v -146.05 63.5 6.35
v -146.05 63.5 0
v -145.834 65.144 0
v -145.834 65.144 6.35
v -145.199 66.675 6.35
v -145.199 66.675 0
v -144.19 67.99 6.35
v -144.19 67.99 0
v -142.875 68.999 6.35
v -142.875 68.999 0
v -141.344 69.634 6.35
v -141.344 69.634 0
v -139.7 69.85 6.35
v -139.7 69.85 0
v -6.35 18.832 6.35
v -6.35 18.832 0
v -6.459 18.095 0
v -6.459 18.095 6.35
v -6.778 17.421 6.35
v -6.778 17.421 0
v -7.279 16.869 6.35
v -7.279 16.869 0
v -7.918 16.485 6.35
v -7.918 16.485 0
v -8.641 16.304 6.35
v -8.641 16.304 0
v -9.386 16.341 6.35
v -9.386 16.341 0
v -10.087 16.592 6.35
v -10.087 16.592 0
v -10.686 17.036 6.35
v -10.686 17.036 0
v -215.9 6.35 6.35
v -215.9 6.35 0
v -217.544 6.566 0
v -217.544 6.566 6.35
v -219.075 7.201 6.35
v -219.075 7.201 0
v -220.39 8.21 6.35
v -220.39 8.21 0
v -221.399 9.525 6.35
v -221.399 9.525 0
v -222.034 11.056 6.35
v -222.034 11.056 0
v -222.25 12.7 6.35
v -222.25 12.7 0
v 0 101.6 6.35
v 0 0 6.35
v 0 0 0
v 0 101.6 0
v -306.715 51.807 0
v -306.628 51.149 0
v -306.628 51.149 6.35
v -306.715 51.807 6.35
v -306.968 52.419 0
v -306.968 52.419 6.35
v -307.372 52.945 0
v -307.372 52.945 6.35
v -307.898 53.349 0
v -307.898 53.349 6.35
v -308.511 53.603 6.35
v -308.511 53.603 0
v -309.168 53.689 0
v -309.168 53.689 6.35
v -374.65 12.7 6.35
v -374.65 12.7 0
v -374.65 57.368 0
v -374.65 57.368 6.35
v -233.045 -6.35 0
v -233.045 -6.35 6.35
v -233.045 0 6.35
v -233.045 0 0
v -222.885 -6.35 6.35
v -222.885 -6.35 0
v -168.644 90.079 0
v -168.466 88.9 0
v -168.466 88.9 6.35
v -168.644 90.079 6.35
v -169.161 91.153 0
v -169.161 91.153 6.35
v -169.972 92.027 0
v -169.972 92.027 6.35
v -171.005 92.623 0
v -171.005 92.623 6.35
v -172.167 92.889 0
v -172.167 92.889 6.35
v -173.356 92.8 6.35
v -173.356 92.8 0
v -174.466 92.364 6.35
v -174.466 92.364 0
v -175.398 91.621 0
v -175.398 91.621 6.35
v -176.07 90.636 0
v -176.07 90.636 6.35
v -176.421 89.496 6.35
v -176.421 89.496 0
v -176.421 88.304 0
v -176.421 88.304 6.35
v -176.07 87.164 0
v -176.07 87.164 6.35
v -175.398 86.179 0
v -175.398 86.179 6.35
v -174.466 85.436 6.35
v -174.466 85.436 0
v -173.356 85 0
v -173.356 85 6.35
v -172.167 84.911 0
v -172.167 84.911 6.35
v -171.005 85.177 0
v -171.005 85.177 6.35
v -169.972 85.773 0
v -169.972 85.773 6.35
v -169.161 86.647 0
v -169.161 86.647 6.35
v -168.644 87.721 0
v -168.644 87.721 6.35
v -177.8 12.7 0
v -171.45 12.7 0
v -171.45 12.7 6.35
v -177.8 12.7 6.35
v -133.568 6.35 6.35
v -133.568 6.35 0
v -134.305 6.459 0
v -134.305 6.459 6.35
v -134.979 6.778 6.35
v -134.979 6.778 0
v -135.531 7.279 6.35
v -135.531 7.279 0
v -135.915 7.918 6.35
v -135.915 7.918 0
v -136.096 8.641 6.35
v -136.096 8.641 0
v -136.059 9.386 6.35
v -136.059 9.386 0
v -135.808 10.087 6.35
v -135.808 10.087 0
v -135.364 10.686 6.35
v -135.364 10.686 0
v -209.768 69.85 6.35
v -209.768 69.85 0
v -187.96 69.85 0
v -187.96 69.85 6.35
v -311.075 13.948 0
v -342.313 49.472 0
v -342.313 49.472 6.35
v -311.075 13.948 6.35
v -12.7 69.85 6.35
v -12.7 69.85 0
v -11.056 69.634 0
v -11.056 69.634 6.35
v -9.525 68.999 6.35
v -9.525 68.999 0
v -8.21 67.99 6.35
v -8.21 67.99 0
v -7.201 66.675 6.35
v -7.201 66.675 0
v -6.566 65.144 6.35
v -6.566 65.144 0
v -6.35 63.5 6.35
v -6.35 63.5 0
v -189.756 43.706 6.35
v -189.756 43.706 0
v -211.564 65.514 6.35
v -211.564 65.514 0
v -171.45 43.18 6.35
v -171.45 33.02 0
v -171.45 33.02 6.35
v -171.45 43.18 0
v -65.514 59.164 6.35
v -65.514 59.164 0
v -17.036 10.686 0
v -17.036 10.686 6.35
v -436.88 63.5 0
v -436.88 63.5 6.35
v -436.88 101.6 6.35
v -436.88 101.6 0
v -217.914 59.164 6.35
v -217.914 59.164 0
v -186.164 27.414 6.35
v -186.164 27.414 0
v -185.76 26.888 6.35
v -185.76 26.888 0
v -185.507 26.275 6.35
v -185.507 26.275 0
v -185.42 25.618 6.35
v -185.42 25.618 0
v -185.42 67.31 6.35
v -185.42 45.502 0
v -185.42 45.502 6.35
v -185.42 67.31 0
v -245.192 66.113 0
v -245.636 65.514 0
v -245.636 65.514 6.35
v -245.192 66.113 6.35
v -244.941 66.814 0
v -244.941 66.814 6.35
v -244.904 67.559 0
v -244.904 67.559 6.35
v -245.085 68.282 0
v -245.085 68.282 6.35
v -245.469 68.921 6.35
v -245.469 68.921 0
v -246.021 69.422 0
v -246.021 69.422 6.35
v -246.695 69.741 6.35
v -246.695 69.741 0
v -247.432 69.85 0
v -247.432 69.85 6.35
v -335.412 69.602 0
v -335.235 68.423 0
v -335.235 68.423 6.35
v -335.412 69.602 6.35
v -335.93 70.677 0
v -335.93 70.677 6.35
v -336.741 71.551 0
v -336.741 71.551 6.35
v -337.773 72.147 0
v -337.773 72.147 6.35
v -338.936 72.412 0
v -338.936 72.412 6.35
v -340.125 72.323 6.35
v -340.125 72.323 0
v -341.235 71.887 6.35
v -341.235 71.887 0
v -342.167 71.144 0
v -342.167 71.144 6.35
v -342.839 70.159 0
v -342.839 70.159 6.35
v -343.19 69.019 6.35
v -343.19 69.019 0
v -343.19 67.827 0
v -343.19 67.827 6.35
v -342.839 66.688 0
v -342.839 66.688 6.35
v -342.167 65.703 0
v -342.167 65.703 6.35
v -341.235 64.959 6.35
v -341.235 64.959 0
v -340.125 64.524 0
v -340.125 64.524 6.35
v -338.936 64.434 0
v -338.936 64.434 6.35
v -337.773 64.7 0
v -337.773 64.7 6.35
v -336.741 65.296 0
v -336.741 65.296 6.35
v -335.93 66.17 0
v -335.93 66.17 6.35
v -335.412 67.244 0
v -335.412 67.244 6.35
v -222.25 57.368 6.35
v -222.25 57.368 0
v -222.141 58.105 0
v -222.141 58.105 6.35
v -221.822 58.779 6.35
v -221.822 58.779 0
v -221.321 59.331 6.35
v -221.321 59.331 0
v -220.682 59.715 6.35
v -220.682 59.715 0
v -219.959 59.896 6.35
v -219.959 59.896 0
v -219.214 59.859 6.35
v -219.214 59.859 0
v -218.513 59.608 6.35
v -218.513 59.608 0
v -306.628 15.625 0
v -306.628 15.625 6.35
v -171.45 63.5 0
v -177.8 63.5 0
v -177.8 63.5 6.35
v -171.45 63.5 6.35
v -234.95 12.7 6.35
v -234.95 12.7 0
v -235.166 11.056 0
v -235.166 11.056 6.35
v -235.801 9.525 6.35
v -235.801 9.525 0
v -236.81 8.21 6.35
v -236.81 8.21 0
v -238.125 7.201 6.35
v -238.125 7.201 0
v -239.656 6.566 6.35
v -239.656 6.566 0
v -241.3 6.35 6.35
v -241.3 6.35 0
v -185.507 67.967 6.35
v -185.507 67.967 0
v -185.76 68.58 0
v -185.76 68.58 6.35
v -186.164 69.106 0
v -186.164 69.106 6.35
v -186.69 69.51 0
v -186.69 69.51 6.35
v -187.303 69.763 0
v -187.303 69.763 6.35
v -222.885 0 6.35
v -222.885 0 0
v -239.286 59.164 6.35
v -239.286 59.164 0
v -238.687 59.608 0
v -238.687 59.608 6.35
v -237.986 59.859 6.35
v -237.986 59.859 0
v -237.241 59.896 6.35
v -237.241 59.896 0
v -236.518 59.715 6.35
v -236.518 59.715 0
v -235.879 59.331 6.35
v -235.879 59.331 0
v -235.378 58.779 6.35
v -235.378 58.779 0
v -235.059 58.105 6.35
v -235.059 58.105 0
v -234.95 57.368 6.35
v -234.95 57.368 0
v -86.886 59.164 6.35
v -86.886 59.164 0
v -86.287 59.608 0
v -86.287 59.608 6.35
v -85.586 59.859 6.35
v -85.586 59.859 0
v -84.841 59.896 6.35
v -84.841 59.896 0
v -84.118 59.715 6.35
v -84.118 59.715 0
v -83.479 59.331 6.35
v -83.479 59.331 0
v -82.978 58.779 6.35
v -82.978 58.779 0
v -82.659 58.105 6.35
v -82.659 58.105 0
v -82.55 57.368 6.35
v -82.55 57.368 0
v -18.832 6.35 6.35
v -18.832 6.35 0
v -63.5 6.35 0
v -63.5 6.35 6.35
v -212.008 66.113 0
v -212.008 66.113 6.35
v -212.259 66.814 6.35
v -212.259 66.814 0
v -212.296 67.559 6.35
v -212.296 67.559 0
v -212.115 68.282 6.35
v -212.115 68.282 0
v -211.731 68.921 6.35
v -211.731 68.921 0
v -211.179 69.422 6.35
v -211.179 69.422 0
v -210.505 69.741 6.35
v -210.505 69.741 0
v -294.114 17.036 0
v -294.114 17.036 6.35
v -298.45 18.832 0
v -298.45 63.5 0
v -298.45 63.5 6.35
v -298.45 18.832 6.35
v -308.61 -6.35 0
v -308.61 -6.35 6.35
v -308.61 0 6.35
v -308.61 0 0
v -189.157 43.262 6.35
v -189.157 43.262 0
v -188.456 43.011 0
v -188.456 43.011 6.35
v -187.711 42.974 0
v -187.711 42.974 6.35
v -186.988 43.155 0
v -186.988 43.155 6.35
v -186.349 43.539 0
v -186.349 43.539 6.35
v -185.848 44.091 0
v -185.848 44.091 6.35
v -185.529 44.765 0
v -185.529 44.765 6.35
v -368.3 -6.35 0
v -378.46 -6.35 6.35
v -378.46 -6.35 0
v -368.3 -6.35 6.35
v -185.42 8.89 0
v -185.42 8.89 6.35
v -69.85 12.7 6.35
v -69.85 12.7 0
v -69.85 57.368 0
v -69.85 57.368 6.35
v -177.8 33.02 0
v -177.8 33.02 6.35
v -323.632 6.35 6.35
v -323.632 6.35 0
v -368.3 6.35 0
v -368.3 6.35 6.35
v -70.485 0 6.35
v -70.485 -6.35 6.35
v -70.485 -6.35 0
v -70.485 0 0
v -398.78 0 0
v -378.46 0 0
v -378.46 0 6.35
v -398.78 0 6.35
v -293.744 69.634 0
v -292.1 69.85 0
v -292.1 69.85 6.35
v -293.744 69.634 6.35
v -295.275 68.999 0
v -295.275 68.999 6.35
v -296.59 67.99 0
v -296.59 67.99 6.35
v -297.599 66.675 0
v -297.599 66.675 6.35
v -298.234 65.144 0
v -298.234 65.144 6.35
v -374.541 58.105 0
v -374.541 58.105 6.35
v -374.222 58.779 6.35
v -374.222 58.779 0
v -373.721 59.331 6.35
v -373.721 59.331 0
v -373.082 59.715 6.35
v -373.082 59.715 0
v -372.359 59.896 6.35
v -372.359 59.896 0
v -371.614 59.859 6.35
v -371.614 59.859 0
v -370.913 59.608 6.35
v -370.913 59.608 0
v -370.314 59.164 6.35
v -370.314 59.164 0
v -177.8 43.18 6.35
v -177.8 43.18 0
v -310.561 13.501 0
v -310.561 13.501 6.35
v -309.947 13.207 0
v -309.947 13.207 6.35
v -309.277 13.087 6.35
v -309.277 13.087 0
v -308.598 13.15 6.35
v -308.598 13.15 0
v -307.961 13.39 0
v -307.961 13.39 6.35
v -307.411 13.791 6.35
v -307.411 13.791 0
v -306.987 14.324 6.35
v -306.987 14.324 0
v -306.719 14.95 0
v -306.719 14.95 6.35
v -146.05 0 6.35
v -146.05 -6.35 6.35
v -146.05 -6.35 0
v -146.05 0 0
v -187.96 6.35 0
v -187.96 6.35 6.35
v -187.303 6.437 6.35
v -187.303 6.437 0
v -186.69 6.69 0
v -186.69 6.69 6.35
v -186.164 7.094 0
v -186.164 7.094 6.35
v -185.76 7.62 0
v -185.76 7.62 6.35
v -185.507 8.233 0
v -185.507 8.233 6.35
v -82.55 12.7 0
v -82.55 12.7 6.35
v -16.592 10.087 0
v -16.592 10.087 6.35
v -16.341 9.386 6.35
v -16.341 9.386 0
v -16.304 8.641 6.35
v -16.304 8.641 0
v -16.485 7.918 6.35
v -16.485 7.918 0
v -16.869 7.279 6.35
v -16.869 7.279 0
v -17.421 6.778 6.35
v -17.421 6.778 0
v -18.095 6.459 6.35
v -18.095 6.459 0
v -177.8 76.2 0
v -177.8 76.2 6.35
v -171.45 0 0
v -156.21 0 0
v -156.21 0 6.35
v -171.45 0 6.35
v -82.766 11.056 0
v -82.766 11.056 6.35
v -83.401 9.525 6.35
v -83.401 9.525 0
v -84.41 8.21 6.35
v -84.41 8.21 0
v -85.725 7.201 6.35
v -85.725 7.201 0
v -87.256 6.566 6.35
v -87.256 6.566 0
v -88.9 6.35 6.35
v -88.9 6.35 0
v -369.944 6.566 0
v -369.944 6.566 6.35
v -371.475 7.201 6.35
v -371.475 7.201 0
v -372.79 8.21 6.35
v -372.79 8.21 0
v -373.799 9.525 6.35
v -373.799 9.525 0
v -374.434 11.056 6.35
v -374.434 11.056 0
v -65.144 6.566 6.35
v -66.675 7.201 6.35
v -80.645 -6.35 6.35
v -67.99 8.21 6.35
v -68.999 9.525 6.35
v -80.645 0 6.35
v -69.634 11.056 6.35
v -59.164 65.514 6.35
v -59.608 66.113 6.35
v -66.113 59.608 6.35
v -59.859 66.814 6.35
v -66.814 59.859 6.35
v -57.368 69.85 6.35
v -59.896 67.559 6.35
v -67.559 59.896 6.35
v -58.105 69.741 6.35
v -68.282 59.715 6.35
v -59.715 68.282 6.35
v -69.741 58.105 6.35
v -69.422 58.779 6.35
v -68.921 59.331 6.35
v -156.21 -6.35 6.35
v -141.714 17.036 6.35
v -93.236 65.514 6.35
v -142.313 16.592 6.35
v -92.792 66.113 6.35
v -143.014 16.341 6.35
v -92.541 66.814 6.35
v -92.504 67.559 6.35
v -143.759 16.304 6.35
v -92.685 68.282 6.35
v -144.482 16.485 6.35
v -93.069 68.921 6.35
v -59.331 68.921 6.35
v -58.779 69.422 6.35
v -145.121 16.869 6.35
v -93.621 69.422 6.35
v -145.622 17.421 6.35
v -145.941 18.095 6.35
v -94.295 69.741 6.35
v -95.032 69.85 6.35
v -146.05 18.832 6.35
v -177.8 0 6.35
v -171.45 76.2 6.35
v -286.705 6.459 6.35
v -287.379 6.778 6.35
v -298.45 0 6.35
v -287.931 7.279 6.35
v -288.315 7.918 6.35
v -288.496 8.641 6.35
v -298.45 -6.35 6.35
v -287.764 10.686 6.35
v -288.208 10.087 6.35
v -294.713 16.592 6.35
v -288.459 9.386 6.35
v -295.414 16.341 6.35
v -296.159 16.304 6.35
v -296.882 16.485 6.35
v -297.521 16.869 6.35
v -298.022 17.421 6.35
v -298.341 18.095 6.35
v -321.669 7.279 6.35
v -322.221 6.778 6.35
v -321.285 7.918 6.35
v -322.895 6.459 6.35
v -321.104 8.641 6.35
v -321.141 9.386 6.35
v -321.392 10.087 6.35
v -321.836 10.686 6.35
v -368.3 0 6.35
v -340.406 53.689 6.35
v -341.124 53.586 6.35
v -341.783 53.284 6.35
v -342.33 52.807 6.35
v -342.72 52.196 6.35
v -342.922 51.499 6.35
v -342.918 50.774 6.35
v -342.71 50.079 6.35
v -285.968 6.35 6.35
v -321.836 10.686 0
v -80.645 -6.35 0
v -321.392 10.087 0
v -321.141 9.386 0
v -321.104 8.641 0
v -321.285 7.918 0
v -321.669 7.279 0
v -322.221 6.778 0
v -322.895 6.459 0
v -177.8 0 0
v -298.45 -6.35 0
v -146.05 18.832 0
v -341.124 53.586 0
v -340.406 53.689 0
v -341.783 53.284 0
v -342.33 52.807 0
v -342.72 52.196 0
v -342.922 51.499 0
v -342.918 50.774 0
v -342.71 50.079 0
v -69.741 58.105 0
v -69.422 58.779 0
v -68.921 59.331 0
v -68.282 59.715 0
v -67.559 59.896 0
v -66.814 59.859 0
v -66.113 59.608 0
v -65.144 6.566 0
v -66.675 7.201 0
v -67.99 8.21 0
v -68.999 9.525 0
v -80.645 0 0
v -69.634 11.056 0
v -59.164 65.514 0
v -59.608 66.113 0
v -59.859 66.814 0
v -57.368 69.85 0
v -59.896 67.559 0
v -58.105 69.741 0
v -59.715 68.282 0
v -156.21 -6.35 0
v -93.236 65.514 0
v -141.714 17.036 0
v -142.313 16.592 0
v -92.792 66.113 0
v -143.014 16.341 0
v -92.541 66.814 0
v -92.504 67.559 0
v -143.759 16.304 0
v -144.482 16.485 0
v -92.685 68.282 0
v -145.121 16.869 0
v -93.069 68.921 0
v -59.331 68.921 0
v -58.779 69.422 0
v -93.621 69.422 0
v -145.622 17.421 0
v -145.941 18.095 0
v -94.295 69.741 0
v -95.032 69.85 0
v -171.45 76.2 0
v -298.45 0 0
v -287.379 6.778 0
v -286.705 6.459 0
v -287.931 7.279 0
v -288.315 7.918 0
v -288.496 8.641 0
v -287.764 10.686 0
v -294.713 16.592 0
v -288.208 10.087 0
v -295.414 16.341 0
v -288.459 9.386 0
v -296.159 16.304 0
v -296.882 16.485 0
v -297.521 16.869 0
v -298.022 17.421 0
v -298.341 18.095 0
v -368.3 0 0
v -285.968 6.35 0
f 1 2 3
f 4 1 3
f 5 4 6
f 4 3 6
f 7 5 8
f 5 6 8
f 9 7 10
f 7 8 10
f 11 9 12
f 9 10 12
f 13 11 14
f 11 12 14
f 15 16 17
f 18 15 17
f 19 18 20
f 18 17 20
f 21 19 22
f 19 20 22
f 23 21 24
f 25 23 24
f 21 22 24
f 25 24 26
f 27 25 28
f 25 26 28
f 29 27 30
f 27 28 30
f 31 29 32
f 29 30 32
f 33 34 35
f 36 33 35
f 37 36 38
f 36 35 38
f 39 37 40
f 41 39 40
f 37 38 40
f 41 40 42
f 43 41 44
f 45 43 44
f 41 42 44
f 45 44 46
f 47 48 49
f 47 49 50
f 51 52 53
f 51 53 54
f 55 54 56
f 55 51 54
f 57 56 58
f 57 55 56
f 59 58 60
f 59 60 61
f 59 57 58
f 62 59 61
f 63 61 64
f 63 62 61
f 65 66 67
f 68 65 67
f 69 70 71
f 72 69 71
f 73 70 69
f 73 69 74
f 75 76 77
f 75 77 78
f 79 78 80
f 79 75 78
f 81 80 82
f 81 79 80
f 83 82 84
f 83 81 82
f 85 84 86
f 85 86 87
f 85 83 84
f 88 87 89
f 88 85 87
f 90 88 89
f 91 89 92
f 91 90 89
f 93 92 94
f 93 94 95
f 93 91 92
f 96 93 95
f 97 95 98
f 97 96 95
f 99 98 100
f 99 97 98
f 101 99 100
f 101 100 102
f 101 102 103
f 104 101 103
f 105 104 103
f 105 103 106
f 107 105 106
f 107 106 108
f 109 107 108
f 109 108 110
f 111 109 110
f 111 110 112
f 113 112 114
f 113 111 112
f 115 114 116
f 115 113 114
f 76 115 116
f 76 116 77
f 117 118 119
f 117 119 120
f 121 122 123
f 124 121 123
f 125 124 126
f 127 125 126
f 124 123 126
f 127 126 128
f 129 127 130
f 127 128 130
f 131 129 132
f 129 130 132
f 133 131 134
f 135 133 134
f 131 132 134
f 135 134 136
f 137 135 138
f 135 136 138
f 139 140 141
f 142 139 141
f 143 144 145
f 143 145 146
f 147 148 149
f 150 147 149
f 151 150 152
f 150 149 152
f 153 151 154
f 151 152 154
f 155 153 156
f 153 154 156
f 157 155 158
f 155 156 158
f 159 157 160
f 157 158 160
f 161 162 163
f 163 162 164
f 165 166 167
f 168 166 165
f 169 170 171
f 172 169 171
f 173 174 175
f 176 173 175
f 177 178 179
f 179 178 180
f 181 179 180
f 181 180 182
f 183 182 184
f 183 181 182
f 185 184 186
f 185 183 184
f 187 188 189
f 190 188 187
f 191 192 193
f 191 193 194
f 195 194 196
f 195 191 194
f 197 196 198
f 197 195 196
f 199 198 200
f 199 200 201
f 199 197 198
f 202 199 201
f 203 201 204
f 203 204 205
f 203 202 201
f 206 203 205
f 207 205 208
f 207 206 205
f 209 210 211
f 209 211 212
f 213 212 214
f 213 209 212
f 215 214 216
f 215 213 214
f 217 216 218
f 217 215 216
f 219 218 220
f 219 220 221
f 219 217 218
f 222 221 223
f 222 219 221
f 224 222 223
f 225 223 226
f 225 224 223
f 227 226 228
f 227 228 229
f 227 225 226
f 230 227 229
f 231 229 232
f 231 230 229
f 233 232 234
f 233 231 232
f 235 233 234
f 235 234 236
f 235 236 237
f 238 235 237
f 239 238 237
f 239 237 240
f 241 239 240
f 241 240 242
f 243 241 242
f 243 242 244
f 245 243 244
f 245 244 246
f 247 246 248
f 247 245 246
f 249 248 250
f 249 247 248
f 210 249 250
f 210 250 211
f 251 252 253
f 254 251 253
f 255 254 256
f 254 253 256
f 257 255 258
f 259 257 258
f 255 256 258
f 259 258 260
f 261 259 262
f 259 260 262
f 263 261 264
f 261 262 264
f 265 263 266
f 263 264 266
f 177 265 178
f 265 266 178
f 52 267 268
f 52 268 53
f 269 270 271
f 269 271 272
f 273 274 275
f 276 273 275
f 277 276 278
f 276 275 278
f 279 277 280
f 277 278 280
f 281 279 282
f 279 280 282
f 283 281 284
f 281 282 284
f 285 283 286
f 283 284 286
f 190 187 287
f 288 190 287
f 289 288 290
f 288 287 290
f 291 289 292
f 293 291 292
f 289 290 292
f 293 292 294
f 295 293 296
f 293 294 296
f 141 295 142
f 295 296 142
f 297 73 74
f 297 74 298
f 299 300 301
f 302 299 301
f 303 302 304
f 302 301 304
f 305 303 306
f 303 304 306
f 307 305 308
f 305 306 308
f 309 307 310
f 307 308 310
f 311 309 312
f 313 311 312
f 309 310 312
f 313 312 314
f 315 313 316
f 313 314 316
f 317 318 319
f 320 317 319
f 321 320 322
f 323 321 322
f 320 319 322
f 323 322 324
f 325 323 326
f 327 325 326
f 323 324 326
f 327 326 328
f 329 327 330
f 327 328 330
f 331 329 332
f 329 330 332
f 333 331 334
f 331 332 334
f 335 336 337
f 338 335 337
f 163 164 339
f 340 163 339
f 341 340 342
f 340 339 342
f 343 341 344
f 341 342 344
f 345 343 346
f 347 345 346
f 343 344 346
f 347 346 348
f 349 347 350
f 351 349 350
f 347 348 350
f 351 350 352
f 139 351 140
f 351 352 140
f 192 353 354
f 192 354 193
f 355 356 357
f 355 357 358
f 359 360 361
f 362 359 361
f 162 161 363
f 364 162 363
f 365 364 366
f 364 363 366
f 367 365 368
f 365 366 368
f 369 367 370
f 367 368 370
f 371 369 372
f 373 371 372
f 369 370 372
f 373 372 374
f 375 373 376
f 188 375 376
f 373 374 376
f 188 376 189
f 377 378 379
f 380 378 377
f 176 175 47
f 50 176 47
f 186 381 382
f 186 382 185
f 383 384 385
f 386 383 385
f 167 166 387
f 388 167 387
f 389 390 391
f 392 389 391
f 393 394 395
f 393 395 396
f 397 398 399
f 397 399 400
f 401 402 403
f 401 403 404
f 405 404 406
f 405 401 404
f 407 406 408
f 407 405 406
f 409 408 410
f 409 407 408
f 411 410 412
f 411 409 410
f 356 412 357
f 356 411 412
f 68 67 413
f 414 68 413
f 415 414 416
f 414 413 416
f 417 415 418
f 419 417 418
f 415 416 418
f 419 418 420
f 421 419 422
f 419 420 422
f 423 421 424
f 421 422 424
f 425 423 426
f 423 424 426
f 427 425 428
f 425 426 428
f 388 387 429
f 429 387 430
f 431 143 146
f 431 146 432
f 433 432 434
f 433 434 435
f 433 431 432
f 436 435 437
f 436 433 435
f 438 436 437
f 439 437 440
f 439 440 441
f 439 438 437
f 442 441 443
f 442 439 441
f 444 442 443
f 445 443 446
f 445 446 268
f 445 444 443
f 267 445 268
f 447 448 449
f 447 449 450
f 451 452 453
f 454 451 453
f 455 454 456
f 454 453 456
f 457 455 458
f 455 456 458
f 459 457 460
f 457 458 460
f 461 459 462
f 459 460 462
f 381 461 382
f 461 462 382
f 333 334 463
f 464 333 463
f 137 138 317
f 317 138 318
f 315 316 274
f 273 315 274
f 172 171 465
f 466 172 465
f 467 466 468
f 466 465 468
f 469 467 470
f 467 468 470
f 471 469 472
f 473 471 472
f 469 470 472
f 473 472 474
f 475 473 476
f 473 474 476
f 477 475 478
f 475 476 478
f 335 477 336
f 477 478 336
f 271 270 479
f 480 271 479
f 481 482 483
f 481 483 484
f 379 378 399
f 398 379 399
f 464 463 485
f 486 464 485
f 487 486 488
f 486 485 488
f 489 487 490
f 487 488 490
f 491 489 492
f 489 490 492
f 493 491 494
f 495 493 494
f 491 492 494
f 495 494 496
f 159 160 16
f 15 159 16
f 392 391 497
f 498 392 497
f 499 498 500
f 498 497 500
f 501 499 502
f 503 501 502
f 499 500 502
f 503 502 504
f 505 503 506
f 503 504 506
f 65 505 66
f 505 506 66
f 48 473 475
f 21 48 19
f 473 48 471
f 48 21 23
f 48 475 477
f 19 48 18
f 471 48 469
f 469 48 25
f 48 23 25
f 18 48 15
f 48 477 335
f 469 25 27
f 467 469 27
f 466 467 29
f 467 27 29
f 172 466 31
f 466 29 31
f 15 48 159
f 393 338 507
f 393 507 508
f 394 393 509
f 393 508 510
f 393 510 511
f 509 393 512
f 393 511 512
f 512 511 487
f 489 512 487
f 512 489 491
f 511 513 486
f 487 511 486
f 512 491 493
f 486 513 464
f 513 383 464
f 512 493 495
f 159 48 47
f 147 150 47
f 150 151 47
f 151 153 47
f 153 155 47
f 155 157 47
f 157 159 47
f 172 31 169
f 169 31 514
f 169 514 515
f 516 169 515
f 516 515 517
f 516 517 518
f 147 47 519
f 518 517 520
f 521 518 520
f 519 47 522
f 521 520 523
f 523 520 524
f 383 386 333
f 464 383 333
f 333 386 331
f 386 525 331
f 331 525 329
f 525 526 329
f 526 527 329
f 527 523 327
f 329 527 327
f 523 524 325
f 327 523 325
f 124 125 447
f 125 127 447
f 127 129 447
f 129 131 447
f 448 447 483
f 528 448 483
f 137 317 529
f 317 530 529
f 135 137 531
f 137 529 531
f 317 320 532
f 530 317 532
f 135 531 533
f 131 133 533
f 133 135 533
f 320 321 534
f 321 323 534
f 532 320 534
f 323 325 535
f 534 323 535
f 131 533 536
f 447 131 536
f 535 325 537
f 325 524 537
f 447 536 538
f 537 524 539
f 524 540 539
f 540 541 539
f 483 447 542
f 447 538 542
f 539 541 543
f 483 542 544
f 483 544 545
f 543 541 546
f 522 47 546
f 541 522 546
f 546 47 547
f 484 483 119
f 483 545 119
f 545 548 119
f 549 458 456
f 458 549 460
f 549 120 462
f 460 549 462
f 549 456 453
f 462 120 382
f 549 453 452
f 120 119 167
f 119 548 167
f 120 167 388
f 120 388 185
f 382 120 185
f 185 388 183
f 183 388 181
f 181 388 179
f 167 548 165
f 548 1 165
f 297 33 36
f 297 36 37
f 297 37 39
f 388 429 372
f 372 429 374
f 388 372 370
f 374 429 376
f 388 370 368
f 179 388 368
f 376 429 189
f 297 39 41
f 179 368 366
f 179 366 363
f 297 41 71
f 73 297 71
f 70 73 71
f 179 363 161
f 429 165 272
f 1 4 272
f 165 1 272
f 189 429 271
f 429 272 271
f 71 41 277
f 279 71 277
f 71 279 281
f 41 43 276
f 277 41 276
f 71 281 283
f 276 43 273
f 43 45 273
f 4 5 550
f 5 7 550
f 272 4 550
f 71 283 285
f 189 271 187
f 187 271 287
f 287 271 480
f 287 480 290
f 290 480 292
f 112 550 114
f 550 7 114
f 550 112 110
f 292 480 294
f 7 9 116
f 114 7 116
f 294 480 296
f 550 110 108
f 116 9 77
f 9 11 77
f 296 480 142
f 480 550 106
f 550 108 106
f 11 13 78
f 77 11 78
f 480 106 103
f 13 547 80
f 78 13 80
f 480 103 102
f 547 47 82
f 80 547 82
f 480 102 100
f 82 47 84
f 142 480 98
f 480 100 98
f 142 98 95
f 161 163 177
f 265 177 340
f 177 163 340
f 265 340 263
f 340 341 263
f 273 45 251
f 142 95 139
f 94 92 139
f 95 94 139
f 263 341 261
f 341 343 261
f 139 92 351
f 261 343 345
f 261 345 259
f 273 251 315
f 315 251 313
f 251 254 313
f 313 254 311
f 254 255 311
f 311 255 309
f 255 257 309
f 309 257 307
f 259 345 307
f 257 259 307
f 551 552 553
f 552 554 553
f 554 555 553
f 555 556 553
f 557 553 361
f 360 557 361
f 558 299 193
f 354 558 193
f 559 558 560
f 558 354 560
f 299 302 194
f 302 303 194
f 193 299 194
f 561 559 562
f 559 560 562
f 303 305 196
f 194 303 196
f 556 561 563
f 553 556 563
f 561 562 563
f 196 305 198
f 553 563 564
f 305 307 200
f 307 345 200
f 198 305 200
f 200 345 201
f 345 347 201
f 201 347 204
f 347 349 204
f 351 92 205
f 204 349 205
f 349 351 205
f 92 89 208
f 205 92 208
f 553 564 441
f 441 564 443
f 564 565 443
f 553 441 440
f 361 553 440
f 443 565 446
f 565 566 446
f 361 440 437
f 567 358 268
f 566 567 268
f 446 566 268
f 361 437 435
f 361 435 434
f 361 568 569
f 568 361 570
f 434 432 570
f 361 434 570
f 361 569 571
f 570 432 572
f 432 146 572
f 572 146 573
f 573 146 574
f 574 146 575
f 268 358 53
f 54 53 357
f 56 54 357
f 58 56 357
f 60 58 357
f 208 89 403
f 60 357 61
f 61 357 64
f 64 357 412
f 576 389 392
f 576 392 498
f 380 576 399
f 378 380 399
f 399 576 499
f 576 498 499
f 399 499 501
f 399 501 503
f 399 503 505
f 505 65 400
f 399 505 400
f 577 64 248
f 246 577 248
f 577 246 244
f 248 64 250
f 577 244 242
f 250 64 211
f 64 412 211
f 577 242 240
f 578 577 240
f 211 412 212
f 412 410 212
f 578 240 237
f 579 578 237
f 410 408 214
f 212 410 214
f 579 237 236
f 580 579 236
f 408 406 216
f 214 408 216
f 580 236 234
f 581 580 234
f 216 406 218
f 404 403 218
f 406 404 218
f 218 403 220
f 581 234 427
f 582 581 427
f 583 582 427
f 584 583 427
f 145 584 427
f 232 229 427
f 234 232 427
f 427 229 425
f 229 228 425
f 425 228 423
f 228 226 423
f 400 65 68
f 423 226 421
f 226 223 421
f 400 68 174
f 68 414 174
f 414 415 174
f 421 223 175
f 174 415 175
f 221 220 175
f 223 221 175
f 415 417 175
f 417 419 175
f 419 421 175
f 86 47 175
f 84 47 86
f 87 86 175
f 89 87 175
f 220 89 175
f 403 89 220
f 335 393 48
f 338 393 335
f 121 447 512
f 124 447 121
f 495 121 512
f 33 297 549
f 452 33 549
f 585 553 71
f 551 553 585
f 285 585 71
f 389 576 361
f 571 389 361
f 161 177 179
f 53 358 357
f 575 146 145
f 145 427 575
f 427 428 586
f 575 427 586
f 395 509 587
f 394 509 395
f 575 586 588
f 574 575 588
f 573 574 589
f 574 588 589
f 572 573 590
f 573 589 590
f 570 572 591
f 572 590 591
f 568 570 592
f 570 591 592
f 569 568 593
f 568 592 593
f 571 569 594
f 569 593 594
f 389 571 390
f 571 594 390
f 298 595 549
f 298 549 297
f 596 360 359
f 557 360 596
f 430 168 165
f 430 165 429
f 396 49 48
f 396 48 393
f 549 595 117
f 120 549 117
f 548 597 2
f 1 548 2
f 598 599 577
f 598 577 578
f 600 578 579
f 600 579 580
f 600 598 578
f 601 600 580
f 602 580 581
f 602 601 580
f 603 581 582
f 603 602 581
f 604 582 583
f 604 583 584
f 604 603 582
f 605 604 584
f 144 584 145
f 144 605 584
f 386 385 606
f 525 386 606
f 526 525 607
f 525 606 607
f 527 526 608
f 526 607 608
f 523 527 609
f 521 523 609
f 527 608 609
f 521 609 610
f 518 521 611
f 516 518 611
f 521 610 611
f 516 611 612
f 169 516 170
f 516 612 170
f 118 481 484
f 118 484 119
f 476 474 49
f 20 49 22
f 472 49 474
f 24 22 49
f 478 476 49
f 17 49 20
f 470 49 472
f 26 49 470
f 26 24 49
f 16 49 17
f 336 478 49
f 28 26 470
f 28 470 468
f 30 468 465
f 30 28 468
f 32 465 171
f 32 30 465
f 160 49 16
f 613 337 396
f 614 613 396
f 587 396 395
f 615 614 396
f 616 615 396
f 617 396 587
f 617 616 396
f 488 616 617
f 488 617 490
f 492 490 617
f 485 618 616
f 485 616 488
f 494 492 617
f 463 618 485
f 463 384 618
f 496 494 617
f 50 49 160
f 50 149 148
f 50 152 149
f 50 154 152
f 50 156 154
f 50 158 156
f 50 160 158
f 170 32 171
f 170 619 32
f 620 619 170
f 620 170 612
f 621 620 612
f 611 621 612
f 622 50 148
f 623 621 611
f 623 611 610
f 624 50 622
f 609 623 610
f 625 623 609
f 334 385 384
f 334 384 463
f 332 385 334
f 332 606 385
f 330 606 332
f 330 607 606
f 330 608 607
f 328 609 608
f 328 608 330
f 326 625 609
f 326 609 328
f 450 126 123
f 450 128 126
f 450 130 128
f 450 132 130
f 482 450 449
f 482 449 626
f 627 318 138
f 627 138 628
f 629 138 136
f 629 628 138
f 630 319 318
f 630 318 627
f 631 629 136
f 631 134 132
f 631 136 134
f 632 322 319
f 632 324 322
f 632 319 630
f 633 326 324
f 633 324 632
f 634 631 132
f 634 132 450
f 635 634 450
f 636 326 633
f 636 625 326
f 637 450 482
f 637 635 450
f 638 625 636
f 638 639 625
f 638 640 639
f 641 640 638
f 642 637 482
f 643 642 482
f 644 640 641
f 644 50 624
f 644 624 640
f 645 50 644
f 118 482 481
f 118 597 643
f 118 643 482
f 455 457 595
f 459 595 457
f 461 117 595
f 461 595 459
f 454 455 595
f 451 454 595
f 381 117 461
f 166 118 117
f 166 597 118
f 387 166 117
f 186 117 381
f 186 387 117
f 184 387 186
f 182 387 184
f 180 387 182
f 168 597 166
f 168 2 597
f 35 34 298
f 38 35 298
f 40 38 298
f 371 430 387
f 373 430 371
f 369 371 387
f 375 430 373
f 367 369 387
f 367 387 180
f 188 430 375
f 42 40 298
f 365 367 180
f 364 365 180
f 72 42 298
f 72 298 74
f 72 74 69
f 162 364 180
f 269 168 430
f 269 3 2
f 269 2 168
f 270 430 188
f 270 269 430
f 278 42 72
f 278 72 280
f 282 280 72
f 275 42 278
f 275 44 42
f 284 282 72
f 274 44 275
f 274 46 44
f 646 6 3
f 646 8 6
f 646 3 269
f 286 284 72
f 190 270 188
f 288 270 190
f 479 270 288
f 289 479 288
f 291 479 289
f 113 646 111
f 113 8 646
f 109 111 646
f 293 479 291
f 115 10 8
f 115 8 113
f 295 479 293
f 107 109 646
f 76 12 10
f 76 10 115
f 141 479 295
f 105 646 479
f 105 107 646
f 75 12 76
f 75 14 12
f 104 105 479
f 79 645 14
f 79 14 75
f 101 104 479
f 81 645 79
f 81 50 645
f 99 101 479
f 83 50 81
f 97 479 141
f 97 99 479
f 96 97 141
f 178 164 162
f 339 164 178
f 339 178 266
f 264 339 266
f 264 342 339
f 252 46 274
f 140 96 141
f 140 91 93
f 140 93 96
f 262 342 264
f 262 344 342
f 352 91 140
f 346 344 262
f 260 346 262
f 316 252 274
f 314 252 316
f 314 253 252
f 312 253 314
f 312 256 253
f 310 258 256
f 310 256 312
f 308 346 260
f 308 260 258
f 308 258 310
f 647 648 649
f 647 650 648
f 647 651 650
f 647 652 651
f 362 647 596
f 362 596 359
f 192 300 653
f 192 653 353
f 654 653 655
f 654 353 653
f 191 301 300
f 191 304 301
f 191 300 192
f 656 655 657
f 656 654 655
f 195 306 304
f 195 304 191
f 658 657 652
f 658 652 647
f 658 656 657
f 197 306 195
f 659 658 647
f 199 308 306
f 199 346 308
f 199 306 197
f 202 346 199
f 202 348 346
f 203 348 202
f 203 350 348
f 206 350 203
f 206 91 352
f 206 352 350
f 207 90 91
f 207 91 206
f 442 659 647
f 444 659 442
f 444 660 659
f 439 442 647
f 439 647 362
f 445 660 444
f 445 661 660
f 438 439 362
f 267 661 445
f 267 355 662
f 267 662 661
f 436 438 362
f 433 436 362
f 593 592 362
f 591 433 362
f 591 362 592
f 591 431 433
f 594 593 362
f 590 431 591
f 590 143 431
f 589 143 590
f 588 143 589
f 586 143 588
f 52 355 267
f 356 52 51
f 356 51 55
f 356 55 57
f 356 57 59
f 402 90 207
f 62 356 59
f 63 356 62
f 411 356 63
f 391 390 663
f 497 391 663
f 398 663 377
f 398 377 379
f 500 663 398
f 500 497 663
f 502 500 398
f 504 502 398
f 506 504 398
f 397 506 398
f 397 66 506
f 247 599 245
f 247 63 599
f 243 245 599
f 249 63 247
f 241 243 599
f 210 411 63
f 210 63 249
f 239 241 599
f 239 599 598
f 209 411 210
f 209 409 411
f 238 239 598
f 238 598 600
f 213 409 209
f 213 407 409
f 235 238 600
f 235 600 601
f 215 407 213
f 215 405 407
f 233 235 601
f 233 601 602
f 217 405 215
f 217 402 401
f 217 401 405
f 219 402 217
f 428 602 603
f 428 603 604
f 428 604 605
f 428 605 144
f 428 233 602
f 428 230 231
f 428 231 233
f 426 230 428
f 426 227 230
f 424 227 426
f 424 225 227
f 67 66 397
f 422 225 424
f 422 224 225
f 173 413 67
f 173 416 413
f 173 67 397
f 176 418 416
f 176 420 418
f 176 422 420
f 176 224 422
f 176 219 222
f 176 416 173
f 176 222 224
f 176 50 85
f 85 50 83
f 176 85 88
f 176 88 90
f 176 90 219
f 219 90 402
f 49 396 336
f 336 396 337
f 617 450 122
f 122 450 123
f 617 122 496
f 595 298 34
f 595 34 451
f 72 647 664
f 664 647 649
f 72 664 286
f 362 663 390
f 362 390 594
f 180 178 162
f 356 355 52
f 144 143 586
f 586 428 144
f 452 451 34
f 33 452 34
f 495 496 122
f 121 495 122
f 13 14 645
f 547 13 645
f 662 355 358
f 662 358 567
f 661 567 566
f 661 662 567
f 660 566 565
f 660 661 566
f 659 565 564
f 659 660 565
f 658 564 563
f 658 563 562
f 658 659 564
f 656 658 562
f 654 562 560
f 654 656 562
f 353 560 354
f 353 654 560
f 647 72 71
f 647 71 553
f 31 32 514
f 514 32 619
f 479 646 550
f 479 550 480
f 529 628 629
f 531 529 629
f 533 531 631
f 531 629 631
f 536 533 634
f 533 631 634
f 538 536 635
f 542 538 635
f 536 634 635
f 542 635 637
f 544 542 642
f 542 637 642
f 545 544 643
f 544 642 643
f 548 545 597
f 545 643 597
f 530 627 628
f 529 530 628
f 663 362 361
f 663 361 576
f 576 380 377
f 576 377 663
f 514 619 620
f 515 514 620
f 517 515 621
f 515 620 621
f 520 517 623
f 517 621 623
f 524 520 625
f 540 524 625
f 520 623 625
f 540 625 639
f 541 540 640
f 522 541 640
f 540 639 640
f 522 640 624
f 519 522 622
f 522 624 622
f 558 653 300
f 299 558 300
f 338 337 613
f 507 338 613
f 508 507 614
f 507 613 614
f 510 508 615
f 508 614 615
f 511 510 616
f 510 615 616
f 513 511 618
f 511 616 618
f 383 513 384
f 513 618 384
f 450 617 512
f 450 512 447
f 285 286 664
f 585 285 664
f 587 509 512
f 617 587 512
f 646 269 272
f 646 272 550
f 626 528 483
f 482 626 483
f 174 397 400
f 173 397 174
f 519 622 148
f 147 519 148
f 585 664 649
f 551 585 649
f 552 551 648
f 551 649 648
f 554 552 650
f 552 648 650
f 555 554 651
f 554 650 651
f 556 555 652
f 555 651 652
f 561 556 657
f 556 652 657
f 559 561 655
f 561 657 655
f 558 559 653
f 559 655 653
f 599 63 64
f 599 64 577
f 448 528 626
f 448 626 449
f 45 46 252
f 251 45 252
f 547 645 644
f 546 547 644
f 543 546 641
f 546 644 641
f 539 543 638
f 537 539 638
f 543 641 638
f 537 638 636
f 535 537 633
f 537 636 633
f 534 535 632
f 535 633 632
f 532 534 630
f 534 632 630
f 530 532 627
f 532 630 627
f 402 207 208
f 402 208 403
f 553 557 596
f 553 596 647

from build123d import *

# Parameters (mm, degrees)
MODEL_R             = 4
BOSS_EXTRUDE1_DEPTH = 6.35
SKETCH1_W           = 10.16
SKETCH1_H           = 6.35
SKETCH1_W_2         = 436.88
BOSS_EXTRUDE2_DEPTH = 6.35
SKETCH2_W           = 6.35
SKETCH2_H           = 10.16
BOSS_EXTRUDE3_DEPTH = 6.35
SKETCH2_3_W         = 6.35
SKETCH2_3_H         = 6.35
SKETCH2_3_H_2       = 12.7
CUT_EXTRUDE1_DEPTH  = 6.35
SKETCH3_W           = 12.986644794
SKETCH3_H           = 59.111624581
BOSS_EXTRUDE4_DEPTH = 6.35
BOSS_EXTRUDE6_DEPTH = 6.35


with BuildPart() as part:
    # Model → Boss-Extrude1 (new body)
    with BuildSketch(Plane.XY):
        Polygon((-398.78, 0), (-436.88, 63.5), (-436.88, 95.25), (0, 95.25), (0, 0), align=None)
        with Locations((-172.466, 88.9)):
            Circle(MODEL_R, mode=Mode.SUBTRACT)
        with Locations((-339.23478, 68.423282)):
            Circle(MODEL_R, mode=Mode.SUBTRACT)
        with BuildLine():
            Line((-306.628052638, 15.624984002), (-306.628052638, 51.149330332))
            ThreePointArc((-306.628052638, 51.149330332), (-307.372001413, 52.945381557), (-309.168052638, 53.689330332))
            Line((-309.168052638, 53.689330332), (-340.406029433, 53.689330332))
            ThreePointArc((-340.406029433, 53.689330332), (-342.720322456, 52.196062295), (-342.31346603, 49.472045137))
            Line((-342.31346603, 49.472045137), (-311.075489235, 13.947698807))
            ThreePointArc((-311.075489235, 13.947698807), (-308.271751616, 13.248380443), (-306.628052638, 15.624984002))
        make_face(mode=Mode.SUBTRACT)
        with BuildLine():
            Line((-171.232102448, 6.35), (-215.9, 6.35))
            ThreePointArc((-215.9, 6.35), (-220.390128061, 8.209871939), (-222.25, 12.7))
            Line((-222.25, 12.7), (-222.25, 57.367897552))
            ThreePointArc((-222.25, 57.367897552), (-220.682015918, 59.714551564), (-217.913948776, 59.163948776))
            Line((-217.913948776, 59.163948776), (-169.436051224, 10.686051224))
            ThreePointArc((-169.436051224, 10.686051224), (-168.885448436, 7.917984082), (-171.232102448, 6.35))
        make_face(mode=Mode.SUBTRACT)
        with BuildLine():
            Line((-234.95, 57.367897552), (-234.95, 12.7))
            ThreePointArc((-234.95, 12.7), (-236.809871939, 8.209871939), (-241.3, 6.35))
            Line((-241.3, 6.35), (-285.967897552, 6.35))
            ThreePointArc((-285.967897552, 6.35), (-288.314551564, 7.917984082), (-287.763948776, 10.686051224))
            Line((-287.763948776, 10.686051224), (-239.286051224, 59.163948776))
            ThreePointArc((-239.286051224, 59.163948776), (-236.517984082, 59.714551564), (-234.95, 57.367897552))
        make_face(mode=Mode.SUBTRACT)
        with BuildLine():
            Line((-294.113948776, 17.036051224), (-245.636051224, 65.513948776))
            ThreePointArc((-245.636051224, 65.513948776), (-245.085448436, 68.282015918), (-247.432102448, 69.85))
            Line((-247.432102448, 69.85), (-292.1, 69.85))
            ThreePointArc((-292.1, 69.85), (-296.590128061, 67.990128061), (-298.45, 63.5))
            Line((-298.45, 63.5), (-298.45, 18.832102448))
            ThreePointArc((-298.45, 18.832102448), (-296.882015918, 16.485448436), (-294.113948776, 17.036051224))
        make_face(mode=Mode.SUBTRACT)
        with BuildLine():
            Line((-323.632102448, 6.35), (-368.3, 6.35))
            ThreePointArc((-368.3, 6.35), (-372.790128061, 8.209871939), (-374.65, 12.7))
            Line((-374.65, 12.7), (-374.65, 57.367897552))
            ThreePointArc((-374.65, 57.367897552), (-373.082015918, 59.714551564), (-370.313948776, 59.163948776))
            Line((-370.313948776, 59.163948776), (-321.836051224, 10.686051224))
            ThreePointArc((-321.836051224, 10.686051224), (-321.285448436, 7.917984082), (-323.632102448, 6.35))
        make_face(mode=Mode.SUBTRACT)
        with BuildLine():
            Line((-18.832102448, 6.35), (-63.5, 6.35))
            ThreePointArc((-63.5, 6.35), (-67.990128061, 8.209871939), (-69.85, 12.7))
            Line((-69.85, 12.7), (-69.85, 57.367897552))
            ThreePointArc((-69.85, 57.367897552), (-68.282015918, 59.714551564), (-65.513948776, 59.163948776))
            Line((-65.513948776, 59.163948776), (-17.036051224, 10.686051224))
            ThreePointArc((-17.036051224, 10.686051224), (-16.485448436, 7.917984082), (-18.832102448, 6.35))
        make_face(mode=Mode.SUBTRACT)
        with BuildLine():
            Line((-82.55, 57.367897552), (-82.55, 12.7))
            ThreePointArc((-82.55, 12.7), (-84.409871939, 8.209871939), (-88.9, 6.35))
            Line((-88.9, 6.35), (-133.567897552, 6.35))
            ThreePointArc((-133.567897552, 6.35), (-135.914551564, 7.917984082), (-135.363948776, 10.686051224))
            Line((-135.363948776, 10.686051224), (-86.886051224, 59.163948776))
            ThreePointArc((-86.886051224, 59.163948776), (-84.117984082, 59.714551564), (-82.55, 57.367897552))
        make_face(mode=Mode.SUBTRACT)
        with BuildLine():
            Line((-93.236051224, 65.513948776), (-141.713948776, 17.036051224))
            ThreePointArc((-141.713948776, 17.036051224), (-144.482015918, 16.485448436), (-146.05, 18.832102448))
            Line((-146.05, 18.832102448), (-146.05, 63.5))
            ThreePointArc((-146.05, 63.5), (-144.190128061, 67.990128061), (-139.7, 69.85))
            Line((-139.7, 69.85), (-95.032102448, 69.85))
            ThreePointArc((-95.032102448, 69.85), (-92.685448436, 68.282015918), (-93.236051224, 65.513948776))
        make_face(mode=Mode.SUBTRACT)
        with BuildLine():
            Line((-163.086051224, 17.036051224), (-211.563948776, 65.513948776))
            ThreePointArc((-211.563948776, 65.513948776), (-212.114551564, 68.282015918), (-209.767897552, 69.85))
            Line((-209.767897552, 69.85), (-165.1, 69.85))
            ThreePointArc((-165.1, 69.85), (-160.609871939, 67.990128061), (-158.75, 63.5))
            Line((-158.75, 63.5), (-158.75, 18.832102448))
            ThreePointArc((-158.75, 18.832102448), (-160.317984082, 16.485448436), (-163.086051224, 17.036051224))
        make_face(mode=Mode.SUBTRACT)
        with BuildLine():
            Line((-6.35, 63.5), (-6.35, 18.832102448))
            ThreePointArc((-6.35, 18.832102448), (-7.917984082, 16.485448436), (-10.686051224, 17.036051224))
            Line((-10.686051224, 17.036051224), (-59.163948776, 65.513948776))
            ThreePointArc((-59.163948776, 65.513948776), (-59.714551564, 68.282015918), (-57.367897552, 69.85))
            Line((-57.367897552, 69.85), (-12.7, 69.85))
            ThreePointArc((-12.7, 69.85), (-8.209871939, 67.990128061), (-6.35, 63.5))
        make_face(mode=Mode.SUBTRACT)
    extrude(amount=BOSS_EXTRUDE1_DEPTH)

    # Sketch1 → Boss-Extrude2 (add)
    with BuildSketch(Plane.XY.offset(6.35)):
        with Locations((-75.565, -3.175)):
            Rectangle(SKETCH1_W, SKETCH1_H)
        with Locations((-151.13, -3.175)):
            Rectangle(SKETCH1_W, SKETCH1_H)
        with Locations((-227.965, -3.175)):
            Rectangle(SKETCH1_W, SKETCH1_H)
        with Locations((-303.53, -3.175)):
            Rectangle(SKETCH1_W, SKETCH1_H)
        with Locations((-373.38, -3.175)):
            Rectangle(SKETCH1_W, SKETCH1_H)
        with Locations((-218.44, 98.425)):
            Rectangle(SKETCH1_W_2, SKETCH1_H)
    extrude(amount=-BOSS_EXTRUDE2_DEPTH)

    # Sketch2 → Boss-Extrude3 (add)
    # profile 1 of 3: a face of its own
    with BuildSketch(Plane(origin=(0, 0, 0), x_dir=(-1, 0, 0), z_dir=(0, 0, -1))):
        Polygon((185.42, 39.37), (185.42, 69.85), (177.8, 69.85), (177.8, 63.5), (171.45, 63.5), (171.45, 69.85), (165.1, 69.85), (165.1, 19.05), align=None)
        with Locations((174.625, 38.1)):
            Rectangle(SKETCH2_W, SKETCH2_H, mode=Mode.SUBTRACT)
    # profile 2 of 3: a face of its own
    with BuildSketch(Plane(origin=(0, 0, 0), x_dir=(-1, 0, 0), z_dir=(0, 0, -1))):
        Polygon((185.42, 6.35), (185.42, 26.67), (171.45, 12.7), (177.8, 12.7), (177.8, 6.35), align=None)
    # profile 3 of 3: a face of its own
    with BuildSketch(Plane(origin=(0, 0, 0), x_dir=(-1, 0, 0), z_dir=(0, 0, -1))):
        with BuildLine():
            Line((171.45, 6.35), (171.45, 12.7))
            Line((171.45, 12.7), (169.436051224, 10.686051224))
            ThreePointArc((169.436051224, 10.686051224), (168.885448436, 7.917984082), (171.232102448, 6.35))
            Line((171.232102448, 6.35), (171.45, 6.35))
        make_face()
    extrude(amount=-BOSS_EXTRUDE3_DEPTH)

    # Sketch2<3> → Cut-Extrude1 (cut)
    with BuildSketch(Plane(origin=(0, 0, 0), x_dir=(-1, 0, 0), z_dir=(0, 0, -1))):
        with Locations((174.625, 73.025)):
            Rectangle(SKETCH2_3_W, SKETCH2_3_H)
        with Locations((174.625, 6.35)):
            Rectangle(SKETCH2_3_W, SKETCH2_3_H_2)
    extrude(amount=-CUT_EXTRUDE1_DEPTH, mode=Mode.SUBTRACT)

    # Sketch3 → Boss-Extrude4 (add)
    with BuildSketch(Plane(origin=(0, 0, 0), x_dir=(-1, 0, 0), z_dir=(0, 0, -1))):
        with Locations((160.895729101, 43.146846623)):
            Rectangle(SKETCH3_W, SKETCH3_H)
    extrude(amount=-BOSS_EXTRUDE4_DEPTH)

    # Sketch4 → Boss-Extrude6 (add)
    with BuildSketch(Plane.XY.offset(6.35)):
        with BuildLine():
            ThreePointArc((-187.96, 6.35), (-186.163948776, 7.093948776), (-185.42, 8.89))
            Line((-185.42, 8.89), (-185.42, 6.35))
            Line((-185.42, 6.35), (-187.96, 6.35))
        make_face()
        with BuildLine():
            Line((-185.42, 26.67), (-186.163948776, 27.413948776))
            ThreePointArc((-186.163948776, 27.413948776), (-185.613345987, 26.58991347), (-185.42, 25.617897552))
            Line((-185.42, 25.617897552), (-185.42, 26.67))
        make_face()
        with BuildLine():
            Line((-185.42, 45.502102448), (-185.42, 39.37))
            Line((-185.42, 39.37), (-189.756051224, 43.706051224))
            ThreePointArc((-189.756051224, 43.706051224), (-186.987984082, 43.155448436), (-185.42, 45.502102448))
        make_face()
        with BuildLine():
            Line((-187.96, 69.85), (-185.42, 69.85))
            Line((-185.42, 69.85), (-185.42, 67.31))
            ThreePointArc((-185.42, 67.31), (-186.163948776, 69.106051224), (-187.96, 69.85))
        make_face()
    extrude(amount=-BOSS_EXTRUDE6_DEPTH)


solid = part.part
